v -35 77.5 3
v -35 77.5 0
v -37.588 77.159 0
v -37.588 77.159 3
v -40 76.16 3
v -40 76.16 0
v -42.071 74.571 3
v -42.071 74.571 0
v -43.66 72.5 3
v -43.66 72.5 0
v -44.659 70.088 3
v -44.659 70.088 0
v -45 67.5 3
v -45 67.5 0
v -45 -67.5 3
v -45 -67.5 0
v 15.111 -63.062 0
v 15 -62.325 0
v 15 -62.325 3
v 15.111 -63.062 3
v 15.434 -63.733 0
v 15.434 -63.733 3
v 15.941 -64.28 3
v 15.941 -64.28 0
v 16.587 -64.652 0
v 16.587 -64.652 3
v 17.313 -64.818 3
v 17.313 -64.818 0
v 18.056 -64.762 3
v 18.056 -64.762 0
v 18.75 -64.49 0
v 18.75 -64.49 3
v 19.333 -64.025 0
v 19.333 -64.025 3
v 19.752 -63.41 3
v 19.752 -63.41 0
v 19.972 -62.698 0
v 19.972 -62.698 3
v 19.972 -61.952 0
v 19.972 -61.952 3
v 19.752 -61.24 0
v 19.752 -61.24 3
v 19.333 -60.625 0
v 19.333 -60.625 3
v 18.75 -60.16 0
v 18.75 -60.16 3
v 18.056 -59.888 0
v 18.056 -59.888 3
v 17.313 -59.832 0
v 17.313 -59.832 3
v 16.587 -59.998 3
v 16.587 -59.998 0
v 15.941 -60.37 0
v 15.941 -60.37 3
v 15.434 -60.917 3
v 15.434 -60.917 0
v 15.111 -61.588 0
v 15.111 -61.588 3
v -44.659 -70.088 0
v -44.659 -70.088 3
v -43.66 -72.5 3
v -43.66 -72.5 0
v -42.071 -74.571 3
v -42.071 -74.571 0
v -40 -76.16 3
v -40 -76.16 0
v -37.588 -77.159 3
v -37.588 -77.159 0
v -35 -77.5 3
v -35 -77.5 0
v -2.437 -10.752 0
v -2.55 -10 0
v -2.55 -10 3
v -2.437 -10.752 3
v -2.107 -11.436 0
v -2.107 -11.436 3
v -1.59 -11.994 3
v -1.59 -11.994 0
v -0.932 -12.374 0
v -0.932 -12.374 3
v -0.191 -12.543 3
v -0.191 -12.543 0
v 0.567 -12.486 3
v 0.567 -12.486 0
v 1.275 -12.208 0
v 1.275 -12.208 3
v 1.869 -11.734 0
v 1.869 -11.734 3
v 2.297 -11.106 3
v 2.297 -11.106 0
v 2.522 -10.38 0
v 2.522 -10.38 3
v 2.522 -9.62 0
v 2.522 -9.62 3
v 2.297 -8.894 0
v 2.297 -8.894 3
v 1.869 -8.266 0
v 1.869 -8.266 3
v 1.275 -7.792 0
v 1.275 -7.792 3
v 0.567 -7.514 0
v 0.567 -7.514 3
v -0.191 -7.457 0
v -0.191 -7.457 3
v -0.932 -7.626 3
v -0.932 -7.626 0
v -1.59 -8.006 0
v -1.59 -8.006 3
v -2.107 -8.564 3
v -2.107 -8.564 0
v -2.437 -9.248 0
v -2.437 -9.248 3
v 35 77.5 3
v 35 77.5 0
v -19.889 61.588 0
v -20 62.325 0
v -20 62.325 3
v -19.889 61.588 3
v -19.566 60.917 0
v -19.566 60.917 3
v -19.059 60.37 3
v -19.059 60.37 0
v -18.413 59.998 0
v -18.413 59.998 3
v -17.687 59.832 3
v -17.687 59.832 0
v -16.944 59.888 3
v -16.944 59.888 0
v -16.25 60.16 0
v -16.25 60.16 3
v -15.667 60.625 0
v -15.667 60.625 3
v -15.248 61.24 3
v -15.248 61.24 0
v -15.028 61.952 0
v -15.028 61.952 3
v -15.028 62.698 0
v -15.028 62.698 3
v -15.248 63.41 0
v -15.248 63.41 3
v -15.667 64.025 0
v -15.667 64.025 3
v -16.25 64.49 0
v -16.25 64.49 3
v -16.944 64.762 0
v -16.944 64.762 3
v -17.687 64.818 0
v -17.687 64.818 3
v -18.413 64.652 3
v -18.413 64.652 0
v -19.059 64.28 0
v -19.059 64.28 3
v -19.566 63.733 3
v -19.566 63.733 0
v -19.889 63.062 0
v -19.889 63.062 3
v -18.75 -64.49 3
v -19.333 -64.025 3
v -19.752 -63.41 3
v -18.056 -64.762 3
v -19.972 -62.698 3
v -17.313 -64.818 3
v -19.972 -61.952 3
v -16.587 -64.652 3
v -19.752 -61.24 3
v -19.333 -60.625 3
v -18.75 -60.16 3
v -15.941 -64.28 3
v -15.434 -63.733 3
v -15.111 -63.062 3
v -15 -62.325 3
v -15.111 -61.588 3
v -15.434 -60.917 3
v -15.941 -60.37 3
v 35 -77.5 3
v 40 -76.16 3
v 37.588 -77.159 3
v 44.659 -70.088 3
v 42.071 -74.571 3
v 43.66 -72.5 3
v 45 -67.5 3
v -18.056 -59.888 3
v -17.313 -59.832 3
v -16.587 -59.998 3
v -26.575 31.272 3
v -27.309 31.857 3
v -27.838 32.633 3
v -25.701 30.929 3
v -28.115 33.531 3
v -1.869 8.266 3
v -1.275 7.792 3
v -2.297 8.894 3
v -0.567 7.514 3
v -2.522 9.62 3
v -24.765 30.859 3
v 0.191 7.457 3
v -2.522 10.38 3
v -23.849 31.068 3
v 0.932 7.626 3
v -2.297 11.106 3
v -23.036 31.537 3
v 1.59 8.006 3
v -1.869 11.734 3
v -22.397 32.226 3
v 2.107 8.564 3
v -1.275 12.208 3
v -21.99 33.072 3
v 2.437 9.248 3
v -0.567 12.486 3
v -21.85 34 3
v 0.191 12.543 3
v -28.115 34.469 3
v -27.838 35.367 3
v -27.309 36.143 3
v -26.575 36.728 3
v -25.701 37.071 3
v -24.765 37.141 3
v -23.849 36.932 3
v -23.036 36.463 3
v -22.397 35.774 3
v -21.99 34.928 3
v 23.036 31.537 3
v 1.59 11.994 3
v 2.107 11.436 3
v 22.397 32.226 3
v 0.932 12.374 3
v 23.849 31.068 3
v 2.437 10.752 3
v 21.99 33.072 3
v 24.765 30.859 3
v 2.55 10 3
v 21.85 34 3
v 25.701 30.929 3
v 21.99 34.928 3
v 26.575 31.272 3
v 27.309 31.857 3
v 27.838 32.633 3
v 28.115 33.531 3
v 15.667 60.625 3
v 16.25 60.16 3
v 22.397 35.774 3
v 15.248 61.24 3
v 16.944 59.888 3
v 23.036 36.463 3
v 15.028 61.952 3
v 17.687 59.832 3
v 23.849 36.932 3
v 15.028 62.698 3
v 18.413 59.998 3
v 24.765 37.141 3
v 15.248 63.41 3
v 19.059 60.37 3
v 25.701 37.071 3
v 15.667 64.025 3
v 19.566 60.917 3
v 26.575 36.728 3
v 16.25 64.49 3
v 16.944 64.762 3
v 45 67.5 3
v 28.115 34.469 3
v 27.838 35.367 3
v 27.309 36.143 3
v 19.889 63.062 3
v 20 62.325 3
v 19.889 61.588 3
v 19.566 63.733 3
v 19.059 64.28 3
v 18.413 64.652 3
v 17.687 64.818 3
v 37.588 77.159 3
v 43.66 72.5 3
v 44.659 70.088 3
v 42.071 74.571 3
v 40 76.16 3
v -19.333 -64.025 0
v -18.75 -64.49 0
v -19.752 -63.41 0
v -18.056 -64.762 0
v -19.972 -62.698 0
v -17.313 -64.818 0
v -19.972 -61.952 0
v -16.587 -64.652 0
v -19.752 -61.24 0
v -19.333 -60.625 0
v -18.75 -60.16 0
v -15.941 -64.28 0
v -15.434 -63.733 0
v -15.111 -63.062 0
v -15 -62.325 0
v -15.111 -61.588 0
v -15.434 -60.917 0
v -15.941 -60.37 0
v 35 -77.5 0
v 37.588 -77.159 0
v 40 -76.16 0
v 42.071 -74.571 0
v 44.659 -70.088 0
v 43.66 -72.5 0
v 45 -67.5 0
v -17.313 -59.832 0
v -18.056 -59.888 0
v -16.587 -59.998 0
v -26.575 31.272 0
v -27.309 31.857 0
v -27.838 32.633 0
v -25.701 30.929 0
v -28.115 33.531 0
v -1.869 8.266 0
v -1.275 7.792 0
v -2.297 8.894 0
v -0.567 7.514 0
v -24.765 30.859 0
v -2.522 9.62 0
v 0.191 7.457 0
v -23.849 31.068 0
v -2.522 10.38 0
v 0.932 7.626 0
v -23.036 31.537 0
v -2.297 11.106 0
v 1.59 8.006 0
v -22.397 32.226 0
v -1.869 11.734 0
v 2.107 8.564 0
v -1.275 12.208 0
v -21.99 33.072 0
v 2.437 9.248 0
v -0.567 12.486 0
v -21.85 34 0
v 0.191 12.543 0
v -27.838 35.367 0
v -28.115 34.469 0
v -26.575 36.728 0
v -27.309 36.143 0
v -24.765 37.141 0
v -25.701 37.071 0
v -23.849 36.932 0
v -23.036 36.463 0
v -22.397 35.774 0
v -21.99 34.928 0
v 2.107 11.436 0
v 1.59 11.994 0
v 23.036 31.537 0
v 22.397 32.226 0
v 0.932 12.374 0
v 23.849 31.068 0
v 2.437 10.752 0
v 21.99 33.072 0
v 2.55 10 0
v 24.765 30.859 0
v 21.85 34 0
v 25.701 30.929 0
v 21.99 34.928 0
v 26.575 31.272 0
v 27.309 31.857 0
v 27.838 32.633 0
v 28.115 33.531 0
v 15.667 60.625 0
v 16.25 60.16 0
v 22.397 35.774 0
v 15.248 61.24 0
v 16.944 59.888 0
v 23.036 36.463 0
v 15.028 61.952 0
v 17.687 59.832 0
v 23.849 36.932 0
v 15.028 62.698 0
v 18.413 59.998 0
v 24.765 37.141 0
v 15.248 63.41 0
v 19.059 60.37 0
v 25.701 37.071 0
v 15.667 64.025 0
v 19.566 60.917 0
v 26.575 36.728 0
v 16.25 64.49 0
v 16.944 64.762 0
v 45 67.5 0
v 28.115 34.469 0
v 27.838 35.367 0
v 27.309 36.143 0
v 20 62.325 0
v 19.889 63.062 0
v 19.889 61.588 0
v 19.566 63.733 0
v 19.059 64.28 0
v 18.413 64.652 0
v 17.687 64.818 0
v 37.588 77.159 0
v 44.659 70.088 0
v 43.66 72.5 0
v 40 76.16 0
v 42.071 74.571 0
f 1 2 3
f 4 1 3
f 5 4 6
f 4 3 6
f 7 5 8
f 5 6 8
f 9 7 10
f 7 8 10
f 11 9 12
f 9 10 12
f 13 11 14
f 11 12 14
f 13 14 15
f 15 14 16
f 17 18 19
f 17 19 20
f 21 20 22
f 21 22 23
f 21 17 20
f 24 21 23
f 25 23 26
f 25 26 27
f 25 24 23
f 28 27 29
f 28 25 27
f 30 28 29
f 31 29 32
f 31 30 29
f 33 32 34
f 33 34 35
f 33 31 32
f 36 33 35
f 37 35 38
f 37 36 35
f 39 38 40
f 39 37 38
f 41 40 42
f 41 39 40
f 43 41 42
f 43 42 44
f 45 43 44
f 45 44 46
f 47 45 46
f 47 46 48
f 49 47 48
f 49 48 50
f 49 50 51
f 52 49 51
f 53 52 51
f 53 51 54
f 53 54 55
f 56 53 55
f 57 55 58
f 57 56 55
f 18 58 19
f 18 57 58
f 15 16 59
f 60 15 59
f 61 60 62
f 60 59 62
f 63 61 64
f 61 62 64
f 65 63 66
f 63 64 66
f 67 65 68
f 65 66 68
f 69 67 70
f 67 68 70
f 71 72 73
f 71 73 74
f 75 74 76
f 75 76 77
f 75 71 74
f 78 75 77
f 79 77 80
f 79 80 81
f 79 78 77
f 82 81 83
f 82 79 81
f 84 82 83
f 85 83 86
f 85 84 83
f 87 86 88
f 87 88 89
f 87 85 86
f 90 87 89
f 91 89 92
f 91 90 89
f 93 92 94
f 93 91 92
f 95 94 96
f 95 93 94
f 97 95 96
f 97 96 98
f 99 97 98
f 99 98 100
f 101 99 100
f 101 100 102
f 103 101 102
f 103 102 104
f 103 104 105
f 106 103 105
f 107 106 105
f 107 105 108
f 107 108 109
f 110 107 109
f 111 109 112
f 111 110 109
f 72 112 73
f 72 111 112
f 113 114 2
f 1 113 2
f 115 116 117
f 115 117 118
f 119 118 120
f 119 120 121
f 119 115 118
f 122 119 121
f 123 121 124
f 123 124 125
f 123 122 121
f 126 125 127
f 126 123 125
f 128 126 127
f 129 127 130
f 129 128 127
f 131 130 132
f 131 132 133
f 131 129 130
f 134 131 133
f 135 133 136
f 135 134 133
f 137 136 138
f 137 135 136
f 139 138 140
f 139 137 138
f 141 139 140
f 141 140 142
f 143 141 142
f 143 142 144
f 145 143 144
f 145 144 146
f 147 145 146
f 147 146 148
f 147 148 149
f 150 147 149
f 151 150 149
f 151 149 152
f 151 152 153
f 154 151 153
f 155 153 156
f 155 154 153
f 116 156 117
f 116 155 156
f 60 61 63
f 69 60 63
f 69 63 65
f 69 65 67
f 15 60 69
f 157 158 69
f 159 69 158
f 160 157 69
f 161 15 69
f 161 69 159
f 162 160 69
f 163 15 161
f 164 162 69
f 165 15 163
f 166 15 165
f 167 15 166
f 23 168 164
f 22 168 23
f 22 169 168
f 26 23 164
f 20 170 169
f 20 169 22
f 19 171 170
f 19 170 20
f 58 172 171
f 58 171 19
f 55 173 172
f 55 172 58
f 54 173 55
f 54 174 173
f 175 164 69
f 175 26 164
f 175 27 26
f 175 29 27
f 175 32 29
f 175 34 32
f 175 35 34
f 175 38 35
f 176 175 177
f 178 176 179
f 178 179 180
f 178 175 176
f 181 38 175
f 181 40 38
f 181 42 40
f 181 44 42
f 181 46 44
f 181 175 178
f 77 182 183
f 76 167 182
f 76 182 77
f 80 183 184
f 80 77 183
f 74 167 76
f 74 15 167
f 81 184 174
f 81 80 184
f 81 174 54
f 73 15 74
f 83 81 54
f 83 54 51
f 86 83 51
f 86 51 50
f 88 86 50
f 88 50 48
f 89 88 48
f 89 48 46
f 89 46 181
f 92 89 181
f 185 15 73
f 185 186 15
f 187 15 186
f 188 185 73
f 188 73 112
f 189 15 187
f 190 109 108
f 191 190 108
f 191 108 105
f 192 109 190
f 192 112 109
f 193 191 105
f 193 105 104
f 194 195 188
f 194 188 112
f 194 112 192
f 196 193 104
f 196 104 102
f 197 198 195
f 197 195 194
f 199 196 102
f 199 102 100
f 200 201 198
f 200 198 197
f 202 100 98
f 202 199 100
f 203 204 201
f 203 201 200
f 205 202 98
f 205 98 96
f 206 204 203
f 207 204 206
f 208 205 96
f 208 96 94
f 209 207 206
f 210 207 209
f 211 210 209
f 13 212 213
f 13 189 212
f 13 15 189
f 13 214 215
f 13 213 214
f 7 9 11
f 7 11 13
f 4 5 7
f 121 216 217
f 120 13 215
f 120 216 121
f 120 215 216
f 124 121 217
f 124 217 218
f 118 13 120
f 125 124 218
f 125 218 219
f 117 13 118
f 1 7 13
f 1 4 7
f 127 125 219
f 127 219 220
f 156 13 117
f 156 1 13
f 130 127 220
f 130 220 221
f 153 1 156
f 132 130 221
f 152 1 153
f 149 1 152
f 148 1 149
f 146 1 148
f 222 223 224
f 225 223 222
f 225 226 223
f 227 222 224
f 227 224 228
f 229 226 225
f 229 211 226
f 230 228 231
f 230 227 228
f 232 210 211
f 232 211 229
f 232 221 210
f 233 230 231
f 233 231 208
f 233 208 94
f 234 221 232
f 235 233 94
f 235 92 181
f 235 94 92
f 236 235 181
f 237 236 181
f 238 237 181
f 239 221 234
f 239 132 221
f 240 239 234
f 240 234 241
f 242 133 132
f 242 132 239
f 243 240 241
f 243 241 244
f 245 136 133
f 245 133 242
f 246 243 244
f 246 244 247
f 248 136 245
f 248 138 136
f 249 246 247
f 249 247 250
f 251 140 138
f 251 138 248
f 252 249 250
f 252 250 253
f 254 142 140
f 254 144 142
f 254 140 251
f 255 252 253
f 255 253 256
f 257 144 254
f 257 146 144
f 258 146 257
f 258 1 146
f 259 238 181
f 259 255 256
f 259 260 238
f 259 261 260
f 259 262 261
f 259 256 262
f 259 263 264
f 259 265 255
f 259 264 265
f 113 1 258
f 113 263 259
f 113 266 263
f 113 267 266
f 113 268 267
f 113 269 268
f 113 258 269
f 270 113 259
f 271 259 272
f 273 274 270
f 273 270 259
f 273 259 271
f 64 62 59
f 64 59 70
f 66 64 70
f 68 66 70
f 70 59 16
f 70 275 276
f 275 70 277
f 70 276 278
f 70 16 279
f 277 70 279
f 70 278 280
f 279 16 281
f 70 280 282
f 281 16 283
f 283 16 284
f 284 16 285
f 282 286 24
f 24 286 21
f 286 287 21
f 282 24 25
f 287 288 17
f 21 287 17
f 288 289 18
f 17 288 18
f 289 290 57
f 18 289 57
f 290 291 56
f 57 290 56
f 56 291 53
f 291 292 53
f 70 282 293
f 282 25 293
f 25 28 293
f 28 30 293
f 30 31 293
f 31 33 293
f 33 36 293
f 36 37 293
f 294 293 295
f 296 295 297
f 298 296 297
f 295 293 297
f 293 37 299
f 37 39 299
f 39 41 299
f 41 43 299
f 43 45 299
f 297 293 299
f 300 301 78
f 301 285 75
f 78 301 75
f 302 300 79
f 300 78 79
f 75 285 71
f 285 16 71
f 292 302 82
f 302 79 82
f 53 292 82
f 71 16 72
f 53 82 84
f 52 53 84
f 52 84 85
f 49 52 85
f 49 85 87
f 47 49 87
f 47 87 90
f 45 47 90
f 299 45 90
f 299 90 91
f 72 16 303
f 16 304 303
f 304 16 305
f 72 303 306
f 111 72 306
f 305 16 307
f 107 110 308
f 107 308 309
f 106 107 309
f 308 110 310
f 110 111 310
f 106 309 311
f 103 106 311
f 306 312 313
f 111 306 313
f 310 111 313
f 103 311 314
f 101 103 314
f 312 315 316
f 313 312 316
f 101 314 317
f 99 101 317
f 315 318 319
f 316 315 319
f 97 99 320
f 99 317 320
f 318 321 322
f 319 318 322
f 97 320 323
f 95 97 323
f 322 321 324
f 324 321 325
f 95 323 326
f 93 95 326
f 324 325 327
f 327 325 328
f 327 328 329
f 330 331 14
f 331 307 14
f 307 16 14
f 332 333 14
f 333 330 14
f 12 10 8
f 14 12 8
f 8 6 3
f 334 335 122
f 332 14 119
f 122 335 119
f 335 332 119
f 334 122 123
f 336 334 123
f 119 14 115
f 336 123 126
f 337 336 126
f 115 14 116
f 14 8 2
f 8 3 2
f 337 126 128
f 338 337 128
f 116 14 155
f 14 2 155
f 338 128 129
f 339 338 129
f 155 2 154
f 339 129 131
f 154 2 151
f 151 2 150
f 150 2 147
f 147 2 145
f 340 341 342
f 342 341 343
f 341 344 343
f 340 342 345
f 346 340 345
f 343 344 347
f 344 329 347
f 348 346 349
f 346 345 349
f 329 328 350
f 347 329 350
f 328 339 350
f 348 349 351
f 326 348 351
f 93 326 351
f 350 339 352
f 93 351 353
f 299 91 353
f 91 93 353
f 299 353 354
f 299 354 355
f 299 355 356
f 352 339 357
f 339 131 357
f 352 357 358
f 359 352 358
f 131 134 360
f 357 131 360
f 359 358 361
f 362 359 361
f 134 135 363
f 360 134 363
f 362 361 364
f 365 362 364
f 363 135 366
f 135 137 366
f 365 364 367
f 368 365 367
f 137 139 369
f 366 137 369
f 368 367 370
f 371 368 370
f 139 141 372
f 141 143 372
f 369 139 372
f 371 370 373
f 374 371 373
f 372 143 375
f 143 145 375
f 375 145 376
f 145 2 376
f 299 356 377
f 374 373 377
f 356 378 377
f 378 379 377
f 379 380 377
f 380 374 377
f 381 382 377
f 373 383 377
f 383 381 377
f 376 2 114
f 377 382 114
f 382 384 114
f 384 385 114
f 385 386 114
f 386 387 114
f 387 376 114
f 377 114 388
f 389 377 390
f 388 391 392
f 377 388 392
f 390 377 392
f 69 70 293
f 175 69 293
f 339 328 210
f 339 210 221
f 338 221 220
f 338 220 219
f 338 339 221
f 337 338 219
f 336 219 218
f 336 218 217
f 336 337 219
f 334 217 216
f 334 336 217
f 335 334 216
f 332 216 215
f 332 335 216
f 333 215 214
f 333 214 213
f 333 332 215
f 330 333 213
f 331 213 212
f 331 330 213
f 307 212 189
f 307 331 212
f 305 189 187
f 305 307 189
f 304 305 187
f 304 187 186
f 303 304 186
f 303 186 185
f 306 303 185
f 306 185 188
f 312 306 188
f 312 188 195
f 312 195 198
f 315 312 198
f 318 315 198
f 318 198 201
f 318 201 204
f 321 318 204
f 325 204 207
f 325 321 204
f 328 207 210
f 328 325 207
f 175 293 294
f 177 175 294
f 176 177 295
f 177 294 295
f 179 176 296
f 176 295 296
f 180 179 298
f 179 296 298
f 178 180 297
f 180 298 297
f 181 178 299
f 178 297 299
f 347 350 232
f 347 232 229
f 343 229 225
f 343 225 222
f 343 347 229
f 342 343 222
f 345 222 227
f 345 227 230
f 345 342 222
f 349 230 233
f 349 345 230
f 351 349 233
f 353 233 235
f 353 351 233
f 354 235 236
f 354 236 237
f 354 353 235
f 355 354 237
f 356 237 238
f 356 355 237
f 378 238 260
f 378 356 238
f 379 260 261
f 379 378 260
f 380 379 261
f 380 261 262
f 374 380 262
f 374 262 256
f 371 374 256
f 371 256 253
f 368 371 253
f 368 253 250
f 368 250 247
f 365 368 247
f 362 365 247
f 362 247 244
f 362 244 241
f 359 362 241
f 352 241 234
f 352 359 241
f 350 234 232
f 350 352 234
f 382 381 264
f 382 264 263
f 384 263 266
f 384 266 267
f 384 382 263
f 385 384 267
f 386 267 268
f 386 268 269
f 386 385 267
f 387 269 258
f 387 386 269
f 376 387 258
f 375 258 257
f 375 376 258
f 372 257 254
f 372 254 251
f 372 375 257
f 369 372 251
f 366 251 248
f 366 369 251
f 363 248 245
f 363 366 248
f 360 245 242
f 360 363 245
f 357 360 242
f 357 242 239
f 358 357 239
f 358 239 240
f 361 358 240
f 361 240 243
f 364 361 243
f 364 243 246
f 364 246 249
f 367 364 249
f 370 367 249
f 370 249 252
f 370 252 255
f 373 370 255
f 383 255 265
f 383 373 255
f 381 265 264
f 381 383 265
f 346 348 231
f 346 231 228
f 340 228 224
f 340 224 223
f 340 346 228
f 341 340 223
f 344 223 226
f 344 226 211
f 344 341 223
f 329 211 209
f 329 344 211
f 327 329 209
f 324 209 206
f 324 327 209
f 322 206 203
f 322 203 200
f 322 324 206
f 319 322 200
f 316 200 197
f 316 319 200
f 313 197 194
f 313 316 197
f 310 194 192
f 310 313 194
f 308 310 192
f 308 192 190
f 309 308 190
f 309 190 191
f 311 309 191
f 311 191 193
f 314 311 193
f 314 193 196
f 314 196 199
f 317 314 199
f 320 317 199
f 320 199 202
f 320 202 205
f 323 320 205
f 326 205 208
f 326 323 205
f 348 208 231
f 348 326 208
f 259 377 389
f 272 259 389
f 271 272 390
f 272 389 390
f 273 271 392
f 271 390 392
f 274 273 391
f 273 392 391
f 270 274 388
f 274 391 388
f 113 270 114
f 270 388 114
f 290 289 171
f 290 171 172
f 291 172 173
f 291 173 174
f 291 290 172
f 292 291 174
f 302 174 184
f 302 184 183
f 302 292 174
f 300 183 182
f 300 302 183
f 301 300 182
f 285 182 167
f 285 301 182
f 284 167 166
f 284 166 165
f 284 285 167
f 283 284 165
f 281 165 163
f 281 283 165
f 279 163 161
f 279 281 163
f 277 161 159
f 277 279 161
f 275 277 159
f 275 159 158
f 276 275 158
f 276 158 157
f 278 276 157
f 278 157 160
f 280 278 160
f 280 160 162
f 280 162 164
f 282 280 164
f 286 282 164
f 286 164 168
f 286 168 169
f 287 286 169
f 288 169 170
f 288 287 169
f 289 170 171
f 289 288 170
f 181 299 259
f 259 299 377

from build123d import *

# Parameters (mm, degrees)
CROQUIS1_R              = 2.5
CROQUIS1_R_2            = 2.55
CROQUIS1_R_3            = 3.15
SALIENTE_EXTRUIR1_DEPTH = 3


with BuildPart() as part:
    # Croquis1 → Saliente-Extruir1 (new body)
    with BuildSketch(Plane.XY):
        with BuildLine():
            Line((35, 77.5), (-35, 77.5))
            ThreePointArc((-35, 77.5), (-42.071067812, 74.571067812), (-45, 67.5))
            Line((-45, 67.5), (-45, -67.5))
            ThreePointArc((-45, -67.5), (-42.071067812, -74.571067812), (-35, -77.5))
            Line((-35, -77.5), (35, -77.5))
            ThreePointArc((35, -77.5), (42.071067812, -74.571067812), (45, -67.5))
            Line((45, -67.5), (45, 67.5))
            ThreePointArc((45, 67.5), (42.071067812, 74.571067812), (35, 77.5))
        make_face()
        with Locations((17.5, 62.325)):
            Circle(CROQUIS1_R, mode=Mode.SUBTRACT)
        with Locations(Location((17.5, -62.325, 0), (0, 0, 180))):
            Circle(CROQUIS1_R, mode=Mode.SUBTRACT)
        with Locations((-17.5, -62.325)):
            Circle(CROQUIS1_R, mode=Mode.SUBTRACT)
        with Locations(Location((-17.5, 62.325, 0), (0, 0, 180))):
            Circle(CROQUIS1_R, mode=Mode.SUBTRACT)
        with Locations((0, 10)):
            Circle(CROQUIS1_R_2, mode=Mode.SUBTRACT)
        with Locations(Location((0, -10, 0), (0, 0, 180))):
            Circle(CROQUIS1_R_2, mode=Mode.SUBTRACT)
        with Locations((-25, 34)):
            Circle(CROQUIS1_R_3, mode=Mode.SUBTRACT)
        with Locations(Location((25, 34, 0), (0, 0, 180))):
            Circle(CROQUIS1_R_3, mode=Mode.SUBTRACT)
    extrude(amount=SALIENTE_EXTRUIR1_DEPTH)


solid = part.part
